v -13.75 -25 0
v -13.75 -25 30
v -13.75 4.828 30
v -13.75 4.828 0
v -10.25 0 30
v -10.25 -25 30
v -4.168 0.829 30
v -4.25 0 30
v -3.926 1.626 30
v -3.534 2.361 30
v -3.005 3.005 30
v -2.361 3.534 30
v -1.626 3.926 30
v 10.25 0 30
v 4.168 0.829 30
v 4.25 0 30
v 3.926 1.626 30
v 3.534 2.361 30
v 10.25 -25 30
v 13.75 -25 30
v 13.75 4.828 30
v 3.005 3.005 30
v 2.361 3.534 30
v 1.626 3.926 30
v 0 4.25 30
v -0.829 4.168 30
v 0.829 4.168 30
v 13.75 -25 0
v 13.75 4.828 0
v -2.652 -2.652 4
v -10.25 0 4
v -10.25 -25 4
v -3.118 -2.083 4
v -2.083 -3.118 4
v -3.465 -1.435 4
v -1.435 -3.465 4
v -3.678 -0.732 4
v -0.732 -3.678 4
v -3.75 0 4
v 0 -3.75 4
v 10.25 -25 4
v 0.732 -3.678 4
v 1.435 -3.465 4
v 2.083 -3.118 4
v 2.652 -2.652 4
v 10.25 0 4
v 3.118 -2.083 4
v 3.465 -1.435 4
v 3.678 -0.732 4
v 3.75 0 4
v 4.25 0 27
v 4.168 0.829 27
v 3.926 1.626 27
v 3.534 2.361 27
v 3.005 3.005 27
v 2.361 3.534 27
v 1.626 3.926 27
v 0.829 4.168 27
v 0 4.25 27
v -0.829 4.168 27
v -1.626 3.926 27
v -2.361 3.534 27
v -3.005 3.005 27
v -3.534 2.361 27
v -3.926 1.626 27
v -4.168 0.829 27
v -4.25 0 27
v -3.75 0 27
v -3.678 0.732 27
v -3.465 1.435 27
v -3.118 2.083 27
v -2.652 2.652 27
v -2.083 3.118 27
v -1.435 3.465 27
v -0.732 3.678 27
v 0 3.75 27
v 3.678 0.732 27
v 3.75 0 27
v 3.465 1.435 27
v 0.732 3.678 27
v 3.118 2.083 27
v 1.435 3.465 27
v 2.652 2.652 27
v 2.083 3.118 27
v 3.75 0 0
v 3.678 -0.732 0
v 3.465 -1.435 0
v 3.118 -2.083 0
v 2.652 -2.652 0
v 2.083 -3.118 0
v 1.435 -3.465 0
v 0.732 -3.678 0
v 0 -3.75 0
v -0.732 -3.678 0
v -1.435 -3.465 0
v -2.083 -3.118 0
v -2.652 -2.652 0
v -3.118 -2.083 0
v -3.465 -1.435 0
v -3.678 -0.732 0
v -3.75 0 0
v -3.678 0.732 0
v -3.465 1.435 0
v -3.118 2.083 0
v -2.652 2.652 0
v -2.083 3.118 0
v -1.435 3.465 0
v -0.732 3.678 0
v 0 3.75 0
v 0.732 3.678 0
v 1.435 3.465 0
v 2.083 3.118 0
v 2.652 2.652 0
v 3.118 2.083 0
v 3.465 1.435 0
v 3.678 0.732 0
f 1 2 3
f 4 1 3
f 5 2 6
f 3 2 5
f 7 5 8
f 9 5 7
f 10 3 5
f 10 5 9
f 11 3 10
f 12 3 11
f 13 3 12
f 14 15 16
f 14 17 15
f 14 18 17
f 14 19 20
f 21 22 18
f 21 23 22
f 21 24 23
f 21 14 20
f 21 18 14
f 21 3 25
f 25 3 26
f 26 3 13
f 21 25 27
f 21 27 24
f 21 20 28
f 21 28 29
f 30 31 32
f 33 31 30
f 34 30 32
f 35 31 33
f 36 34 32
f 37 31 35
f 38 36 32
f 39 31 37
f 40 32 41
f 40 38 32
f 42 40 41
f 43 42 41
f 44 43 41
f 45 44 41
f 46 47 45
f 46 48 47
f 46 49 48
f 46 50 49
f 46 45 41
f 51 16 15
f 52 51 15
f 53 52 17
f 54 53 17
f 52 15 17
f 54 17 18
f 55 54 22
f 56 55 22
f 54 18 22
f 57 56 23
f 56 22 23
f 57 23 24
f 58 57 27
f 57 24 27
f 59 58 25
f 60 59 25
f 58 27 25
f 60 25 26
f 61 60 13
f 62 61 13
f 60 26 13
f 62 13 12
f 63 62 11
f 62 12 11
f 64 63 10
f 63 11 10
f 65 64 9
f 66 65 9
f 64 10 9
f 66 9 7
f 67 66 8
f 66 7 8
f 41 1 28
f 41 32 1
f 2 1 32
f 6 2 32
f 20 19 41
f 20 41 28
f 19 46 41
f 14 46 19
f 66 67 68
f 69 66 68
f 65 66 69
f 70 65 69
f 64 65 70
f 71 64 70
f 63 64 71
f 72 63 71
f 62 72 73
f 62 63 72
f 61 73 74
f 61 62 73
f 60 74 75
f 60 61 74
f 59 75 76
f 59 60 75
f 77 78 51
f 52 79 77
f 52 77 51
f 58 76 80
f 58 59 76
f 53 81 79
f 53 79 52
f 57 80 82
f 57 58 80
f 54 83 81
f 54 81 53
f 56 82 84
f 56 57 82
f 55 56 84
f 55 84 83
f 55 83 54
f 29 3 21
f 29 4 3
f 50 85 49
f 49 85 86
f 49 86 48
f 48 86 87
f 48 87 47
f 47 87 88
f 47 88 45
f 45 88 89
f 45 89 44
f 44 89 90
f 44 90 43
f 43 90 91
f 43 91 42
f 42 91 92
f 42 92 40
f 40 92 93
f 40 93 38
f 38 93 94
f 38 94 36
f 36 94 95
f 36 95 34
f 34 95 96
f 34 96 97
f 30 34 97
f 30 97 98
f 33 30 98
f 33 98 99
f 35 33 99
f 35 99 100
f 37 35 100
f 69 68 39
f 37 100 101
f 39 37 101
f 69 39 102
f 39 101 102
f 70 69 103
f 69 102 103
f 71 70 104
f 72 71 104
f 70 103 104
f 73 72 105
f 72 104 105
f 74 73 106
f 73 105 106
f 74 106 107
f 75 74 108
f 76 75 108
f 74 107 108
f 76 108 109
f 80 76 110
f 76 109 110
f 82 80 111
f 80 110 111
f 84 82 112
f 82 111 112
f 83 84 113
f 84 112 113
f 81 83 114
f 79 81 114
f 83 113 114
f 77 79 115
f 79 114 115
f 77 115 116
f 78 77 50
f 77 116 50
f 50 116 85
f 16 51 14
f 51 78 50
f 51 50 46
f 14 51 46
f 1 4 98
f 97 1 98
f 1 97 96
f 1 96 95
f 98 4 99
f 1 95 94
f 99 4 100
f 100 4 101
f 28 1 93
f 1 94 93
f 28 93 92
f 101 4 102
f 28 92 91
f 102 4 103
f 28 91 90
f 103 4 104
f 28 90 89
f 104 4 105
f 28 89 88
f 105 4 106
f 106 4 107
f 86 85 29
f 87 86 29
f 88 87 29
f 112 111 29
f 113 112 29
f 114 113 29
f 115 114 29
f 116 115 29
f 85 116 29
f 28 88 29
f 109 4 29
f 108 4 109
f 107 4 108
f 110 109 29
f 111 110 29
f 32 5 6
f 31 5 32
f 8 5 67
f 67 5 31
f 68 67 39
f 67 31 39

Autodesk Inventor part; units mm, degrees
ref_plane "YZ Plane" through (0, 0, 0) normal (1, 0, 0) x (0, 1, 0)
ref_plane "XZ Plane" through (0, 0, 0) normal (0, 1, 0) x (-1, 0, 0)
ref_plane "XY Plane" through (0, 0, 0) normal (0, 0, 1) x (1, 0, 0)
sketch "Эскиз1" plane through (0, 0, 0) normal (0, 0, 1) x (1, 0, 0)
  arc A0 (3.75, 0) -> (-3.75, 0) centre (0, 0) ccw
  line L0 (-3.75, 0) -> (-13.75, 0) construction
  line L1 (-13.75, 4.8279) -> (13.75, 4.8279)
  line L2 (-13.75, 0) -> (-3.75, 0)
  line L3 (3.75, 0) -> (13.75, 0)
  line L4 (0, 9.2451) -> (0, -5.452)
  line L5 (-13.75, 0) -> (-13.75, 4.8279)
  line L6 (13.75, 0) -> (13.75, 4.8279)
  point P0 (0, 4.8279)
  dimension "d25" = 3.75
extrude "Выдавливание1" add sketch "Эскиз1" along normal blind 30
sketch "Эскиз4" plane through (0, 0, 30) normal (0, 0, 1) x (1, 0, 0)
  circle A0 centre (0, 0) radius 4.25
  dimension "d22" = 8.5
extrude "Выдавливание4" cut sketch "Эскиз4" against normal blind 3
sketch "Эскиз5" plane through (-13.75, 0, 0) normal (0, -1, 0) x (1, 0, 0)
  line L0 (23.75, -2.1369) -> (23.75, 32.4902)
  line L1 (27.5, 30) -> (0, 30) projected
  line L2 (0, 30) -> (3.5, 30)
  line L3 (0, 30) -> (0, 0)
  line L4 (0, 0) -> (27.5, 0) projected
  line L5 (0, 0) -> (27.5, 0)
  line L6 (27.5, 0) -> (27.5, 30)
  line L7 (27.5, 30) -> (24, 30)
  line L8 (3.5, 4) -> (24, 4)
  line L9 (24, 4) -> (24, 30)
  line L10 (3.5, 30) -> (3.5, 4)
  point P0 (13.75, 0)
  dimension "d26" = 3.5
  dimension "d27" = 3.5
extrude "Выдавливание5" add sketch "Эскиз5" along normal blind 25 contours L4 L3 L1 L10 L8 L0 | L0 L8 L9 L1 L6 L4
sketch "Эскиз6" plane through (-3.75, 0, 4) normal (0, 0, 1) x (1, 0, 0)
  circle A0 centre (3.75, 0) radius 3.75
extrude "Выдавливание6" cut sketch "Эскиз6" against normal blind 25
properties part number "mini_holder"
